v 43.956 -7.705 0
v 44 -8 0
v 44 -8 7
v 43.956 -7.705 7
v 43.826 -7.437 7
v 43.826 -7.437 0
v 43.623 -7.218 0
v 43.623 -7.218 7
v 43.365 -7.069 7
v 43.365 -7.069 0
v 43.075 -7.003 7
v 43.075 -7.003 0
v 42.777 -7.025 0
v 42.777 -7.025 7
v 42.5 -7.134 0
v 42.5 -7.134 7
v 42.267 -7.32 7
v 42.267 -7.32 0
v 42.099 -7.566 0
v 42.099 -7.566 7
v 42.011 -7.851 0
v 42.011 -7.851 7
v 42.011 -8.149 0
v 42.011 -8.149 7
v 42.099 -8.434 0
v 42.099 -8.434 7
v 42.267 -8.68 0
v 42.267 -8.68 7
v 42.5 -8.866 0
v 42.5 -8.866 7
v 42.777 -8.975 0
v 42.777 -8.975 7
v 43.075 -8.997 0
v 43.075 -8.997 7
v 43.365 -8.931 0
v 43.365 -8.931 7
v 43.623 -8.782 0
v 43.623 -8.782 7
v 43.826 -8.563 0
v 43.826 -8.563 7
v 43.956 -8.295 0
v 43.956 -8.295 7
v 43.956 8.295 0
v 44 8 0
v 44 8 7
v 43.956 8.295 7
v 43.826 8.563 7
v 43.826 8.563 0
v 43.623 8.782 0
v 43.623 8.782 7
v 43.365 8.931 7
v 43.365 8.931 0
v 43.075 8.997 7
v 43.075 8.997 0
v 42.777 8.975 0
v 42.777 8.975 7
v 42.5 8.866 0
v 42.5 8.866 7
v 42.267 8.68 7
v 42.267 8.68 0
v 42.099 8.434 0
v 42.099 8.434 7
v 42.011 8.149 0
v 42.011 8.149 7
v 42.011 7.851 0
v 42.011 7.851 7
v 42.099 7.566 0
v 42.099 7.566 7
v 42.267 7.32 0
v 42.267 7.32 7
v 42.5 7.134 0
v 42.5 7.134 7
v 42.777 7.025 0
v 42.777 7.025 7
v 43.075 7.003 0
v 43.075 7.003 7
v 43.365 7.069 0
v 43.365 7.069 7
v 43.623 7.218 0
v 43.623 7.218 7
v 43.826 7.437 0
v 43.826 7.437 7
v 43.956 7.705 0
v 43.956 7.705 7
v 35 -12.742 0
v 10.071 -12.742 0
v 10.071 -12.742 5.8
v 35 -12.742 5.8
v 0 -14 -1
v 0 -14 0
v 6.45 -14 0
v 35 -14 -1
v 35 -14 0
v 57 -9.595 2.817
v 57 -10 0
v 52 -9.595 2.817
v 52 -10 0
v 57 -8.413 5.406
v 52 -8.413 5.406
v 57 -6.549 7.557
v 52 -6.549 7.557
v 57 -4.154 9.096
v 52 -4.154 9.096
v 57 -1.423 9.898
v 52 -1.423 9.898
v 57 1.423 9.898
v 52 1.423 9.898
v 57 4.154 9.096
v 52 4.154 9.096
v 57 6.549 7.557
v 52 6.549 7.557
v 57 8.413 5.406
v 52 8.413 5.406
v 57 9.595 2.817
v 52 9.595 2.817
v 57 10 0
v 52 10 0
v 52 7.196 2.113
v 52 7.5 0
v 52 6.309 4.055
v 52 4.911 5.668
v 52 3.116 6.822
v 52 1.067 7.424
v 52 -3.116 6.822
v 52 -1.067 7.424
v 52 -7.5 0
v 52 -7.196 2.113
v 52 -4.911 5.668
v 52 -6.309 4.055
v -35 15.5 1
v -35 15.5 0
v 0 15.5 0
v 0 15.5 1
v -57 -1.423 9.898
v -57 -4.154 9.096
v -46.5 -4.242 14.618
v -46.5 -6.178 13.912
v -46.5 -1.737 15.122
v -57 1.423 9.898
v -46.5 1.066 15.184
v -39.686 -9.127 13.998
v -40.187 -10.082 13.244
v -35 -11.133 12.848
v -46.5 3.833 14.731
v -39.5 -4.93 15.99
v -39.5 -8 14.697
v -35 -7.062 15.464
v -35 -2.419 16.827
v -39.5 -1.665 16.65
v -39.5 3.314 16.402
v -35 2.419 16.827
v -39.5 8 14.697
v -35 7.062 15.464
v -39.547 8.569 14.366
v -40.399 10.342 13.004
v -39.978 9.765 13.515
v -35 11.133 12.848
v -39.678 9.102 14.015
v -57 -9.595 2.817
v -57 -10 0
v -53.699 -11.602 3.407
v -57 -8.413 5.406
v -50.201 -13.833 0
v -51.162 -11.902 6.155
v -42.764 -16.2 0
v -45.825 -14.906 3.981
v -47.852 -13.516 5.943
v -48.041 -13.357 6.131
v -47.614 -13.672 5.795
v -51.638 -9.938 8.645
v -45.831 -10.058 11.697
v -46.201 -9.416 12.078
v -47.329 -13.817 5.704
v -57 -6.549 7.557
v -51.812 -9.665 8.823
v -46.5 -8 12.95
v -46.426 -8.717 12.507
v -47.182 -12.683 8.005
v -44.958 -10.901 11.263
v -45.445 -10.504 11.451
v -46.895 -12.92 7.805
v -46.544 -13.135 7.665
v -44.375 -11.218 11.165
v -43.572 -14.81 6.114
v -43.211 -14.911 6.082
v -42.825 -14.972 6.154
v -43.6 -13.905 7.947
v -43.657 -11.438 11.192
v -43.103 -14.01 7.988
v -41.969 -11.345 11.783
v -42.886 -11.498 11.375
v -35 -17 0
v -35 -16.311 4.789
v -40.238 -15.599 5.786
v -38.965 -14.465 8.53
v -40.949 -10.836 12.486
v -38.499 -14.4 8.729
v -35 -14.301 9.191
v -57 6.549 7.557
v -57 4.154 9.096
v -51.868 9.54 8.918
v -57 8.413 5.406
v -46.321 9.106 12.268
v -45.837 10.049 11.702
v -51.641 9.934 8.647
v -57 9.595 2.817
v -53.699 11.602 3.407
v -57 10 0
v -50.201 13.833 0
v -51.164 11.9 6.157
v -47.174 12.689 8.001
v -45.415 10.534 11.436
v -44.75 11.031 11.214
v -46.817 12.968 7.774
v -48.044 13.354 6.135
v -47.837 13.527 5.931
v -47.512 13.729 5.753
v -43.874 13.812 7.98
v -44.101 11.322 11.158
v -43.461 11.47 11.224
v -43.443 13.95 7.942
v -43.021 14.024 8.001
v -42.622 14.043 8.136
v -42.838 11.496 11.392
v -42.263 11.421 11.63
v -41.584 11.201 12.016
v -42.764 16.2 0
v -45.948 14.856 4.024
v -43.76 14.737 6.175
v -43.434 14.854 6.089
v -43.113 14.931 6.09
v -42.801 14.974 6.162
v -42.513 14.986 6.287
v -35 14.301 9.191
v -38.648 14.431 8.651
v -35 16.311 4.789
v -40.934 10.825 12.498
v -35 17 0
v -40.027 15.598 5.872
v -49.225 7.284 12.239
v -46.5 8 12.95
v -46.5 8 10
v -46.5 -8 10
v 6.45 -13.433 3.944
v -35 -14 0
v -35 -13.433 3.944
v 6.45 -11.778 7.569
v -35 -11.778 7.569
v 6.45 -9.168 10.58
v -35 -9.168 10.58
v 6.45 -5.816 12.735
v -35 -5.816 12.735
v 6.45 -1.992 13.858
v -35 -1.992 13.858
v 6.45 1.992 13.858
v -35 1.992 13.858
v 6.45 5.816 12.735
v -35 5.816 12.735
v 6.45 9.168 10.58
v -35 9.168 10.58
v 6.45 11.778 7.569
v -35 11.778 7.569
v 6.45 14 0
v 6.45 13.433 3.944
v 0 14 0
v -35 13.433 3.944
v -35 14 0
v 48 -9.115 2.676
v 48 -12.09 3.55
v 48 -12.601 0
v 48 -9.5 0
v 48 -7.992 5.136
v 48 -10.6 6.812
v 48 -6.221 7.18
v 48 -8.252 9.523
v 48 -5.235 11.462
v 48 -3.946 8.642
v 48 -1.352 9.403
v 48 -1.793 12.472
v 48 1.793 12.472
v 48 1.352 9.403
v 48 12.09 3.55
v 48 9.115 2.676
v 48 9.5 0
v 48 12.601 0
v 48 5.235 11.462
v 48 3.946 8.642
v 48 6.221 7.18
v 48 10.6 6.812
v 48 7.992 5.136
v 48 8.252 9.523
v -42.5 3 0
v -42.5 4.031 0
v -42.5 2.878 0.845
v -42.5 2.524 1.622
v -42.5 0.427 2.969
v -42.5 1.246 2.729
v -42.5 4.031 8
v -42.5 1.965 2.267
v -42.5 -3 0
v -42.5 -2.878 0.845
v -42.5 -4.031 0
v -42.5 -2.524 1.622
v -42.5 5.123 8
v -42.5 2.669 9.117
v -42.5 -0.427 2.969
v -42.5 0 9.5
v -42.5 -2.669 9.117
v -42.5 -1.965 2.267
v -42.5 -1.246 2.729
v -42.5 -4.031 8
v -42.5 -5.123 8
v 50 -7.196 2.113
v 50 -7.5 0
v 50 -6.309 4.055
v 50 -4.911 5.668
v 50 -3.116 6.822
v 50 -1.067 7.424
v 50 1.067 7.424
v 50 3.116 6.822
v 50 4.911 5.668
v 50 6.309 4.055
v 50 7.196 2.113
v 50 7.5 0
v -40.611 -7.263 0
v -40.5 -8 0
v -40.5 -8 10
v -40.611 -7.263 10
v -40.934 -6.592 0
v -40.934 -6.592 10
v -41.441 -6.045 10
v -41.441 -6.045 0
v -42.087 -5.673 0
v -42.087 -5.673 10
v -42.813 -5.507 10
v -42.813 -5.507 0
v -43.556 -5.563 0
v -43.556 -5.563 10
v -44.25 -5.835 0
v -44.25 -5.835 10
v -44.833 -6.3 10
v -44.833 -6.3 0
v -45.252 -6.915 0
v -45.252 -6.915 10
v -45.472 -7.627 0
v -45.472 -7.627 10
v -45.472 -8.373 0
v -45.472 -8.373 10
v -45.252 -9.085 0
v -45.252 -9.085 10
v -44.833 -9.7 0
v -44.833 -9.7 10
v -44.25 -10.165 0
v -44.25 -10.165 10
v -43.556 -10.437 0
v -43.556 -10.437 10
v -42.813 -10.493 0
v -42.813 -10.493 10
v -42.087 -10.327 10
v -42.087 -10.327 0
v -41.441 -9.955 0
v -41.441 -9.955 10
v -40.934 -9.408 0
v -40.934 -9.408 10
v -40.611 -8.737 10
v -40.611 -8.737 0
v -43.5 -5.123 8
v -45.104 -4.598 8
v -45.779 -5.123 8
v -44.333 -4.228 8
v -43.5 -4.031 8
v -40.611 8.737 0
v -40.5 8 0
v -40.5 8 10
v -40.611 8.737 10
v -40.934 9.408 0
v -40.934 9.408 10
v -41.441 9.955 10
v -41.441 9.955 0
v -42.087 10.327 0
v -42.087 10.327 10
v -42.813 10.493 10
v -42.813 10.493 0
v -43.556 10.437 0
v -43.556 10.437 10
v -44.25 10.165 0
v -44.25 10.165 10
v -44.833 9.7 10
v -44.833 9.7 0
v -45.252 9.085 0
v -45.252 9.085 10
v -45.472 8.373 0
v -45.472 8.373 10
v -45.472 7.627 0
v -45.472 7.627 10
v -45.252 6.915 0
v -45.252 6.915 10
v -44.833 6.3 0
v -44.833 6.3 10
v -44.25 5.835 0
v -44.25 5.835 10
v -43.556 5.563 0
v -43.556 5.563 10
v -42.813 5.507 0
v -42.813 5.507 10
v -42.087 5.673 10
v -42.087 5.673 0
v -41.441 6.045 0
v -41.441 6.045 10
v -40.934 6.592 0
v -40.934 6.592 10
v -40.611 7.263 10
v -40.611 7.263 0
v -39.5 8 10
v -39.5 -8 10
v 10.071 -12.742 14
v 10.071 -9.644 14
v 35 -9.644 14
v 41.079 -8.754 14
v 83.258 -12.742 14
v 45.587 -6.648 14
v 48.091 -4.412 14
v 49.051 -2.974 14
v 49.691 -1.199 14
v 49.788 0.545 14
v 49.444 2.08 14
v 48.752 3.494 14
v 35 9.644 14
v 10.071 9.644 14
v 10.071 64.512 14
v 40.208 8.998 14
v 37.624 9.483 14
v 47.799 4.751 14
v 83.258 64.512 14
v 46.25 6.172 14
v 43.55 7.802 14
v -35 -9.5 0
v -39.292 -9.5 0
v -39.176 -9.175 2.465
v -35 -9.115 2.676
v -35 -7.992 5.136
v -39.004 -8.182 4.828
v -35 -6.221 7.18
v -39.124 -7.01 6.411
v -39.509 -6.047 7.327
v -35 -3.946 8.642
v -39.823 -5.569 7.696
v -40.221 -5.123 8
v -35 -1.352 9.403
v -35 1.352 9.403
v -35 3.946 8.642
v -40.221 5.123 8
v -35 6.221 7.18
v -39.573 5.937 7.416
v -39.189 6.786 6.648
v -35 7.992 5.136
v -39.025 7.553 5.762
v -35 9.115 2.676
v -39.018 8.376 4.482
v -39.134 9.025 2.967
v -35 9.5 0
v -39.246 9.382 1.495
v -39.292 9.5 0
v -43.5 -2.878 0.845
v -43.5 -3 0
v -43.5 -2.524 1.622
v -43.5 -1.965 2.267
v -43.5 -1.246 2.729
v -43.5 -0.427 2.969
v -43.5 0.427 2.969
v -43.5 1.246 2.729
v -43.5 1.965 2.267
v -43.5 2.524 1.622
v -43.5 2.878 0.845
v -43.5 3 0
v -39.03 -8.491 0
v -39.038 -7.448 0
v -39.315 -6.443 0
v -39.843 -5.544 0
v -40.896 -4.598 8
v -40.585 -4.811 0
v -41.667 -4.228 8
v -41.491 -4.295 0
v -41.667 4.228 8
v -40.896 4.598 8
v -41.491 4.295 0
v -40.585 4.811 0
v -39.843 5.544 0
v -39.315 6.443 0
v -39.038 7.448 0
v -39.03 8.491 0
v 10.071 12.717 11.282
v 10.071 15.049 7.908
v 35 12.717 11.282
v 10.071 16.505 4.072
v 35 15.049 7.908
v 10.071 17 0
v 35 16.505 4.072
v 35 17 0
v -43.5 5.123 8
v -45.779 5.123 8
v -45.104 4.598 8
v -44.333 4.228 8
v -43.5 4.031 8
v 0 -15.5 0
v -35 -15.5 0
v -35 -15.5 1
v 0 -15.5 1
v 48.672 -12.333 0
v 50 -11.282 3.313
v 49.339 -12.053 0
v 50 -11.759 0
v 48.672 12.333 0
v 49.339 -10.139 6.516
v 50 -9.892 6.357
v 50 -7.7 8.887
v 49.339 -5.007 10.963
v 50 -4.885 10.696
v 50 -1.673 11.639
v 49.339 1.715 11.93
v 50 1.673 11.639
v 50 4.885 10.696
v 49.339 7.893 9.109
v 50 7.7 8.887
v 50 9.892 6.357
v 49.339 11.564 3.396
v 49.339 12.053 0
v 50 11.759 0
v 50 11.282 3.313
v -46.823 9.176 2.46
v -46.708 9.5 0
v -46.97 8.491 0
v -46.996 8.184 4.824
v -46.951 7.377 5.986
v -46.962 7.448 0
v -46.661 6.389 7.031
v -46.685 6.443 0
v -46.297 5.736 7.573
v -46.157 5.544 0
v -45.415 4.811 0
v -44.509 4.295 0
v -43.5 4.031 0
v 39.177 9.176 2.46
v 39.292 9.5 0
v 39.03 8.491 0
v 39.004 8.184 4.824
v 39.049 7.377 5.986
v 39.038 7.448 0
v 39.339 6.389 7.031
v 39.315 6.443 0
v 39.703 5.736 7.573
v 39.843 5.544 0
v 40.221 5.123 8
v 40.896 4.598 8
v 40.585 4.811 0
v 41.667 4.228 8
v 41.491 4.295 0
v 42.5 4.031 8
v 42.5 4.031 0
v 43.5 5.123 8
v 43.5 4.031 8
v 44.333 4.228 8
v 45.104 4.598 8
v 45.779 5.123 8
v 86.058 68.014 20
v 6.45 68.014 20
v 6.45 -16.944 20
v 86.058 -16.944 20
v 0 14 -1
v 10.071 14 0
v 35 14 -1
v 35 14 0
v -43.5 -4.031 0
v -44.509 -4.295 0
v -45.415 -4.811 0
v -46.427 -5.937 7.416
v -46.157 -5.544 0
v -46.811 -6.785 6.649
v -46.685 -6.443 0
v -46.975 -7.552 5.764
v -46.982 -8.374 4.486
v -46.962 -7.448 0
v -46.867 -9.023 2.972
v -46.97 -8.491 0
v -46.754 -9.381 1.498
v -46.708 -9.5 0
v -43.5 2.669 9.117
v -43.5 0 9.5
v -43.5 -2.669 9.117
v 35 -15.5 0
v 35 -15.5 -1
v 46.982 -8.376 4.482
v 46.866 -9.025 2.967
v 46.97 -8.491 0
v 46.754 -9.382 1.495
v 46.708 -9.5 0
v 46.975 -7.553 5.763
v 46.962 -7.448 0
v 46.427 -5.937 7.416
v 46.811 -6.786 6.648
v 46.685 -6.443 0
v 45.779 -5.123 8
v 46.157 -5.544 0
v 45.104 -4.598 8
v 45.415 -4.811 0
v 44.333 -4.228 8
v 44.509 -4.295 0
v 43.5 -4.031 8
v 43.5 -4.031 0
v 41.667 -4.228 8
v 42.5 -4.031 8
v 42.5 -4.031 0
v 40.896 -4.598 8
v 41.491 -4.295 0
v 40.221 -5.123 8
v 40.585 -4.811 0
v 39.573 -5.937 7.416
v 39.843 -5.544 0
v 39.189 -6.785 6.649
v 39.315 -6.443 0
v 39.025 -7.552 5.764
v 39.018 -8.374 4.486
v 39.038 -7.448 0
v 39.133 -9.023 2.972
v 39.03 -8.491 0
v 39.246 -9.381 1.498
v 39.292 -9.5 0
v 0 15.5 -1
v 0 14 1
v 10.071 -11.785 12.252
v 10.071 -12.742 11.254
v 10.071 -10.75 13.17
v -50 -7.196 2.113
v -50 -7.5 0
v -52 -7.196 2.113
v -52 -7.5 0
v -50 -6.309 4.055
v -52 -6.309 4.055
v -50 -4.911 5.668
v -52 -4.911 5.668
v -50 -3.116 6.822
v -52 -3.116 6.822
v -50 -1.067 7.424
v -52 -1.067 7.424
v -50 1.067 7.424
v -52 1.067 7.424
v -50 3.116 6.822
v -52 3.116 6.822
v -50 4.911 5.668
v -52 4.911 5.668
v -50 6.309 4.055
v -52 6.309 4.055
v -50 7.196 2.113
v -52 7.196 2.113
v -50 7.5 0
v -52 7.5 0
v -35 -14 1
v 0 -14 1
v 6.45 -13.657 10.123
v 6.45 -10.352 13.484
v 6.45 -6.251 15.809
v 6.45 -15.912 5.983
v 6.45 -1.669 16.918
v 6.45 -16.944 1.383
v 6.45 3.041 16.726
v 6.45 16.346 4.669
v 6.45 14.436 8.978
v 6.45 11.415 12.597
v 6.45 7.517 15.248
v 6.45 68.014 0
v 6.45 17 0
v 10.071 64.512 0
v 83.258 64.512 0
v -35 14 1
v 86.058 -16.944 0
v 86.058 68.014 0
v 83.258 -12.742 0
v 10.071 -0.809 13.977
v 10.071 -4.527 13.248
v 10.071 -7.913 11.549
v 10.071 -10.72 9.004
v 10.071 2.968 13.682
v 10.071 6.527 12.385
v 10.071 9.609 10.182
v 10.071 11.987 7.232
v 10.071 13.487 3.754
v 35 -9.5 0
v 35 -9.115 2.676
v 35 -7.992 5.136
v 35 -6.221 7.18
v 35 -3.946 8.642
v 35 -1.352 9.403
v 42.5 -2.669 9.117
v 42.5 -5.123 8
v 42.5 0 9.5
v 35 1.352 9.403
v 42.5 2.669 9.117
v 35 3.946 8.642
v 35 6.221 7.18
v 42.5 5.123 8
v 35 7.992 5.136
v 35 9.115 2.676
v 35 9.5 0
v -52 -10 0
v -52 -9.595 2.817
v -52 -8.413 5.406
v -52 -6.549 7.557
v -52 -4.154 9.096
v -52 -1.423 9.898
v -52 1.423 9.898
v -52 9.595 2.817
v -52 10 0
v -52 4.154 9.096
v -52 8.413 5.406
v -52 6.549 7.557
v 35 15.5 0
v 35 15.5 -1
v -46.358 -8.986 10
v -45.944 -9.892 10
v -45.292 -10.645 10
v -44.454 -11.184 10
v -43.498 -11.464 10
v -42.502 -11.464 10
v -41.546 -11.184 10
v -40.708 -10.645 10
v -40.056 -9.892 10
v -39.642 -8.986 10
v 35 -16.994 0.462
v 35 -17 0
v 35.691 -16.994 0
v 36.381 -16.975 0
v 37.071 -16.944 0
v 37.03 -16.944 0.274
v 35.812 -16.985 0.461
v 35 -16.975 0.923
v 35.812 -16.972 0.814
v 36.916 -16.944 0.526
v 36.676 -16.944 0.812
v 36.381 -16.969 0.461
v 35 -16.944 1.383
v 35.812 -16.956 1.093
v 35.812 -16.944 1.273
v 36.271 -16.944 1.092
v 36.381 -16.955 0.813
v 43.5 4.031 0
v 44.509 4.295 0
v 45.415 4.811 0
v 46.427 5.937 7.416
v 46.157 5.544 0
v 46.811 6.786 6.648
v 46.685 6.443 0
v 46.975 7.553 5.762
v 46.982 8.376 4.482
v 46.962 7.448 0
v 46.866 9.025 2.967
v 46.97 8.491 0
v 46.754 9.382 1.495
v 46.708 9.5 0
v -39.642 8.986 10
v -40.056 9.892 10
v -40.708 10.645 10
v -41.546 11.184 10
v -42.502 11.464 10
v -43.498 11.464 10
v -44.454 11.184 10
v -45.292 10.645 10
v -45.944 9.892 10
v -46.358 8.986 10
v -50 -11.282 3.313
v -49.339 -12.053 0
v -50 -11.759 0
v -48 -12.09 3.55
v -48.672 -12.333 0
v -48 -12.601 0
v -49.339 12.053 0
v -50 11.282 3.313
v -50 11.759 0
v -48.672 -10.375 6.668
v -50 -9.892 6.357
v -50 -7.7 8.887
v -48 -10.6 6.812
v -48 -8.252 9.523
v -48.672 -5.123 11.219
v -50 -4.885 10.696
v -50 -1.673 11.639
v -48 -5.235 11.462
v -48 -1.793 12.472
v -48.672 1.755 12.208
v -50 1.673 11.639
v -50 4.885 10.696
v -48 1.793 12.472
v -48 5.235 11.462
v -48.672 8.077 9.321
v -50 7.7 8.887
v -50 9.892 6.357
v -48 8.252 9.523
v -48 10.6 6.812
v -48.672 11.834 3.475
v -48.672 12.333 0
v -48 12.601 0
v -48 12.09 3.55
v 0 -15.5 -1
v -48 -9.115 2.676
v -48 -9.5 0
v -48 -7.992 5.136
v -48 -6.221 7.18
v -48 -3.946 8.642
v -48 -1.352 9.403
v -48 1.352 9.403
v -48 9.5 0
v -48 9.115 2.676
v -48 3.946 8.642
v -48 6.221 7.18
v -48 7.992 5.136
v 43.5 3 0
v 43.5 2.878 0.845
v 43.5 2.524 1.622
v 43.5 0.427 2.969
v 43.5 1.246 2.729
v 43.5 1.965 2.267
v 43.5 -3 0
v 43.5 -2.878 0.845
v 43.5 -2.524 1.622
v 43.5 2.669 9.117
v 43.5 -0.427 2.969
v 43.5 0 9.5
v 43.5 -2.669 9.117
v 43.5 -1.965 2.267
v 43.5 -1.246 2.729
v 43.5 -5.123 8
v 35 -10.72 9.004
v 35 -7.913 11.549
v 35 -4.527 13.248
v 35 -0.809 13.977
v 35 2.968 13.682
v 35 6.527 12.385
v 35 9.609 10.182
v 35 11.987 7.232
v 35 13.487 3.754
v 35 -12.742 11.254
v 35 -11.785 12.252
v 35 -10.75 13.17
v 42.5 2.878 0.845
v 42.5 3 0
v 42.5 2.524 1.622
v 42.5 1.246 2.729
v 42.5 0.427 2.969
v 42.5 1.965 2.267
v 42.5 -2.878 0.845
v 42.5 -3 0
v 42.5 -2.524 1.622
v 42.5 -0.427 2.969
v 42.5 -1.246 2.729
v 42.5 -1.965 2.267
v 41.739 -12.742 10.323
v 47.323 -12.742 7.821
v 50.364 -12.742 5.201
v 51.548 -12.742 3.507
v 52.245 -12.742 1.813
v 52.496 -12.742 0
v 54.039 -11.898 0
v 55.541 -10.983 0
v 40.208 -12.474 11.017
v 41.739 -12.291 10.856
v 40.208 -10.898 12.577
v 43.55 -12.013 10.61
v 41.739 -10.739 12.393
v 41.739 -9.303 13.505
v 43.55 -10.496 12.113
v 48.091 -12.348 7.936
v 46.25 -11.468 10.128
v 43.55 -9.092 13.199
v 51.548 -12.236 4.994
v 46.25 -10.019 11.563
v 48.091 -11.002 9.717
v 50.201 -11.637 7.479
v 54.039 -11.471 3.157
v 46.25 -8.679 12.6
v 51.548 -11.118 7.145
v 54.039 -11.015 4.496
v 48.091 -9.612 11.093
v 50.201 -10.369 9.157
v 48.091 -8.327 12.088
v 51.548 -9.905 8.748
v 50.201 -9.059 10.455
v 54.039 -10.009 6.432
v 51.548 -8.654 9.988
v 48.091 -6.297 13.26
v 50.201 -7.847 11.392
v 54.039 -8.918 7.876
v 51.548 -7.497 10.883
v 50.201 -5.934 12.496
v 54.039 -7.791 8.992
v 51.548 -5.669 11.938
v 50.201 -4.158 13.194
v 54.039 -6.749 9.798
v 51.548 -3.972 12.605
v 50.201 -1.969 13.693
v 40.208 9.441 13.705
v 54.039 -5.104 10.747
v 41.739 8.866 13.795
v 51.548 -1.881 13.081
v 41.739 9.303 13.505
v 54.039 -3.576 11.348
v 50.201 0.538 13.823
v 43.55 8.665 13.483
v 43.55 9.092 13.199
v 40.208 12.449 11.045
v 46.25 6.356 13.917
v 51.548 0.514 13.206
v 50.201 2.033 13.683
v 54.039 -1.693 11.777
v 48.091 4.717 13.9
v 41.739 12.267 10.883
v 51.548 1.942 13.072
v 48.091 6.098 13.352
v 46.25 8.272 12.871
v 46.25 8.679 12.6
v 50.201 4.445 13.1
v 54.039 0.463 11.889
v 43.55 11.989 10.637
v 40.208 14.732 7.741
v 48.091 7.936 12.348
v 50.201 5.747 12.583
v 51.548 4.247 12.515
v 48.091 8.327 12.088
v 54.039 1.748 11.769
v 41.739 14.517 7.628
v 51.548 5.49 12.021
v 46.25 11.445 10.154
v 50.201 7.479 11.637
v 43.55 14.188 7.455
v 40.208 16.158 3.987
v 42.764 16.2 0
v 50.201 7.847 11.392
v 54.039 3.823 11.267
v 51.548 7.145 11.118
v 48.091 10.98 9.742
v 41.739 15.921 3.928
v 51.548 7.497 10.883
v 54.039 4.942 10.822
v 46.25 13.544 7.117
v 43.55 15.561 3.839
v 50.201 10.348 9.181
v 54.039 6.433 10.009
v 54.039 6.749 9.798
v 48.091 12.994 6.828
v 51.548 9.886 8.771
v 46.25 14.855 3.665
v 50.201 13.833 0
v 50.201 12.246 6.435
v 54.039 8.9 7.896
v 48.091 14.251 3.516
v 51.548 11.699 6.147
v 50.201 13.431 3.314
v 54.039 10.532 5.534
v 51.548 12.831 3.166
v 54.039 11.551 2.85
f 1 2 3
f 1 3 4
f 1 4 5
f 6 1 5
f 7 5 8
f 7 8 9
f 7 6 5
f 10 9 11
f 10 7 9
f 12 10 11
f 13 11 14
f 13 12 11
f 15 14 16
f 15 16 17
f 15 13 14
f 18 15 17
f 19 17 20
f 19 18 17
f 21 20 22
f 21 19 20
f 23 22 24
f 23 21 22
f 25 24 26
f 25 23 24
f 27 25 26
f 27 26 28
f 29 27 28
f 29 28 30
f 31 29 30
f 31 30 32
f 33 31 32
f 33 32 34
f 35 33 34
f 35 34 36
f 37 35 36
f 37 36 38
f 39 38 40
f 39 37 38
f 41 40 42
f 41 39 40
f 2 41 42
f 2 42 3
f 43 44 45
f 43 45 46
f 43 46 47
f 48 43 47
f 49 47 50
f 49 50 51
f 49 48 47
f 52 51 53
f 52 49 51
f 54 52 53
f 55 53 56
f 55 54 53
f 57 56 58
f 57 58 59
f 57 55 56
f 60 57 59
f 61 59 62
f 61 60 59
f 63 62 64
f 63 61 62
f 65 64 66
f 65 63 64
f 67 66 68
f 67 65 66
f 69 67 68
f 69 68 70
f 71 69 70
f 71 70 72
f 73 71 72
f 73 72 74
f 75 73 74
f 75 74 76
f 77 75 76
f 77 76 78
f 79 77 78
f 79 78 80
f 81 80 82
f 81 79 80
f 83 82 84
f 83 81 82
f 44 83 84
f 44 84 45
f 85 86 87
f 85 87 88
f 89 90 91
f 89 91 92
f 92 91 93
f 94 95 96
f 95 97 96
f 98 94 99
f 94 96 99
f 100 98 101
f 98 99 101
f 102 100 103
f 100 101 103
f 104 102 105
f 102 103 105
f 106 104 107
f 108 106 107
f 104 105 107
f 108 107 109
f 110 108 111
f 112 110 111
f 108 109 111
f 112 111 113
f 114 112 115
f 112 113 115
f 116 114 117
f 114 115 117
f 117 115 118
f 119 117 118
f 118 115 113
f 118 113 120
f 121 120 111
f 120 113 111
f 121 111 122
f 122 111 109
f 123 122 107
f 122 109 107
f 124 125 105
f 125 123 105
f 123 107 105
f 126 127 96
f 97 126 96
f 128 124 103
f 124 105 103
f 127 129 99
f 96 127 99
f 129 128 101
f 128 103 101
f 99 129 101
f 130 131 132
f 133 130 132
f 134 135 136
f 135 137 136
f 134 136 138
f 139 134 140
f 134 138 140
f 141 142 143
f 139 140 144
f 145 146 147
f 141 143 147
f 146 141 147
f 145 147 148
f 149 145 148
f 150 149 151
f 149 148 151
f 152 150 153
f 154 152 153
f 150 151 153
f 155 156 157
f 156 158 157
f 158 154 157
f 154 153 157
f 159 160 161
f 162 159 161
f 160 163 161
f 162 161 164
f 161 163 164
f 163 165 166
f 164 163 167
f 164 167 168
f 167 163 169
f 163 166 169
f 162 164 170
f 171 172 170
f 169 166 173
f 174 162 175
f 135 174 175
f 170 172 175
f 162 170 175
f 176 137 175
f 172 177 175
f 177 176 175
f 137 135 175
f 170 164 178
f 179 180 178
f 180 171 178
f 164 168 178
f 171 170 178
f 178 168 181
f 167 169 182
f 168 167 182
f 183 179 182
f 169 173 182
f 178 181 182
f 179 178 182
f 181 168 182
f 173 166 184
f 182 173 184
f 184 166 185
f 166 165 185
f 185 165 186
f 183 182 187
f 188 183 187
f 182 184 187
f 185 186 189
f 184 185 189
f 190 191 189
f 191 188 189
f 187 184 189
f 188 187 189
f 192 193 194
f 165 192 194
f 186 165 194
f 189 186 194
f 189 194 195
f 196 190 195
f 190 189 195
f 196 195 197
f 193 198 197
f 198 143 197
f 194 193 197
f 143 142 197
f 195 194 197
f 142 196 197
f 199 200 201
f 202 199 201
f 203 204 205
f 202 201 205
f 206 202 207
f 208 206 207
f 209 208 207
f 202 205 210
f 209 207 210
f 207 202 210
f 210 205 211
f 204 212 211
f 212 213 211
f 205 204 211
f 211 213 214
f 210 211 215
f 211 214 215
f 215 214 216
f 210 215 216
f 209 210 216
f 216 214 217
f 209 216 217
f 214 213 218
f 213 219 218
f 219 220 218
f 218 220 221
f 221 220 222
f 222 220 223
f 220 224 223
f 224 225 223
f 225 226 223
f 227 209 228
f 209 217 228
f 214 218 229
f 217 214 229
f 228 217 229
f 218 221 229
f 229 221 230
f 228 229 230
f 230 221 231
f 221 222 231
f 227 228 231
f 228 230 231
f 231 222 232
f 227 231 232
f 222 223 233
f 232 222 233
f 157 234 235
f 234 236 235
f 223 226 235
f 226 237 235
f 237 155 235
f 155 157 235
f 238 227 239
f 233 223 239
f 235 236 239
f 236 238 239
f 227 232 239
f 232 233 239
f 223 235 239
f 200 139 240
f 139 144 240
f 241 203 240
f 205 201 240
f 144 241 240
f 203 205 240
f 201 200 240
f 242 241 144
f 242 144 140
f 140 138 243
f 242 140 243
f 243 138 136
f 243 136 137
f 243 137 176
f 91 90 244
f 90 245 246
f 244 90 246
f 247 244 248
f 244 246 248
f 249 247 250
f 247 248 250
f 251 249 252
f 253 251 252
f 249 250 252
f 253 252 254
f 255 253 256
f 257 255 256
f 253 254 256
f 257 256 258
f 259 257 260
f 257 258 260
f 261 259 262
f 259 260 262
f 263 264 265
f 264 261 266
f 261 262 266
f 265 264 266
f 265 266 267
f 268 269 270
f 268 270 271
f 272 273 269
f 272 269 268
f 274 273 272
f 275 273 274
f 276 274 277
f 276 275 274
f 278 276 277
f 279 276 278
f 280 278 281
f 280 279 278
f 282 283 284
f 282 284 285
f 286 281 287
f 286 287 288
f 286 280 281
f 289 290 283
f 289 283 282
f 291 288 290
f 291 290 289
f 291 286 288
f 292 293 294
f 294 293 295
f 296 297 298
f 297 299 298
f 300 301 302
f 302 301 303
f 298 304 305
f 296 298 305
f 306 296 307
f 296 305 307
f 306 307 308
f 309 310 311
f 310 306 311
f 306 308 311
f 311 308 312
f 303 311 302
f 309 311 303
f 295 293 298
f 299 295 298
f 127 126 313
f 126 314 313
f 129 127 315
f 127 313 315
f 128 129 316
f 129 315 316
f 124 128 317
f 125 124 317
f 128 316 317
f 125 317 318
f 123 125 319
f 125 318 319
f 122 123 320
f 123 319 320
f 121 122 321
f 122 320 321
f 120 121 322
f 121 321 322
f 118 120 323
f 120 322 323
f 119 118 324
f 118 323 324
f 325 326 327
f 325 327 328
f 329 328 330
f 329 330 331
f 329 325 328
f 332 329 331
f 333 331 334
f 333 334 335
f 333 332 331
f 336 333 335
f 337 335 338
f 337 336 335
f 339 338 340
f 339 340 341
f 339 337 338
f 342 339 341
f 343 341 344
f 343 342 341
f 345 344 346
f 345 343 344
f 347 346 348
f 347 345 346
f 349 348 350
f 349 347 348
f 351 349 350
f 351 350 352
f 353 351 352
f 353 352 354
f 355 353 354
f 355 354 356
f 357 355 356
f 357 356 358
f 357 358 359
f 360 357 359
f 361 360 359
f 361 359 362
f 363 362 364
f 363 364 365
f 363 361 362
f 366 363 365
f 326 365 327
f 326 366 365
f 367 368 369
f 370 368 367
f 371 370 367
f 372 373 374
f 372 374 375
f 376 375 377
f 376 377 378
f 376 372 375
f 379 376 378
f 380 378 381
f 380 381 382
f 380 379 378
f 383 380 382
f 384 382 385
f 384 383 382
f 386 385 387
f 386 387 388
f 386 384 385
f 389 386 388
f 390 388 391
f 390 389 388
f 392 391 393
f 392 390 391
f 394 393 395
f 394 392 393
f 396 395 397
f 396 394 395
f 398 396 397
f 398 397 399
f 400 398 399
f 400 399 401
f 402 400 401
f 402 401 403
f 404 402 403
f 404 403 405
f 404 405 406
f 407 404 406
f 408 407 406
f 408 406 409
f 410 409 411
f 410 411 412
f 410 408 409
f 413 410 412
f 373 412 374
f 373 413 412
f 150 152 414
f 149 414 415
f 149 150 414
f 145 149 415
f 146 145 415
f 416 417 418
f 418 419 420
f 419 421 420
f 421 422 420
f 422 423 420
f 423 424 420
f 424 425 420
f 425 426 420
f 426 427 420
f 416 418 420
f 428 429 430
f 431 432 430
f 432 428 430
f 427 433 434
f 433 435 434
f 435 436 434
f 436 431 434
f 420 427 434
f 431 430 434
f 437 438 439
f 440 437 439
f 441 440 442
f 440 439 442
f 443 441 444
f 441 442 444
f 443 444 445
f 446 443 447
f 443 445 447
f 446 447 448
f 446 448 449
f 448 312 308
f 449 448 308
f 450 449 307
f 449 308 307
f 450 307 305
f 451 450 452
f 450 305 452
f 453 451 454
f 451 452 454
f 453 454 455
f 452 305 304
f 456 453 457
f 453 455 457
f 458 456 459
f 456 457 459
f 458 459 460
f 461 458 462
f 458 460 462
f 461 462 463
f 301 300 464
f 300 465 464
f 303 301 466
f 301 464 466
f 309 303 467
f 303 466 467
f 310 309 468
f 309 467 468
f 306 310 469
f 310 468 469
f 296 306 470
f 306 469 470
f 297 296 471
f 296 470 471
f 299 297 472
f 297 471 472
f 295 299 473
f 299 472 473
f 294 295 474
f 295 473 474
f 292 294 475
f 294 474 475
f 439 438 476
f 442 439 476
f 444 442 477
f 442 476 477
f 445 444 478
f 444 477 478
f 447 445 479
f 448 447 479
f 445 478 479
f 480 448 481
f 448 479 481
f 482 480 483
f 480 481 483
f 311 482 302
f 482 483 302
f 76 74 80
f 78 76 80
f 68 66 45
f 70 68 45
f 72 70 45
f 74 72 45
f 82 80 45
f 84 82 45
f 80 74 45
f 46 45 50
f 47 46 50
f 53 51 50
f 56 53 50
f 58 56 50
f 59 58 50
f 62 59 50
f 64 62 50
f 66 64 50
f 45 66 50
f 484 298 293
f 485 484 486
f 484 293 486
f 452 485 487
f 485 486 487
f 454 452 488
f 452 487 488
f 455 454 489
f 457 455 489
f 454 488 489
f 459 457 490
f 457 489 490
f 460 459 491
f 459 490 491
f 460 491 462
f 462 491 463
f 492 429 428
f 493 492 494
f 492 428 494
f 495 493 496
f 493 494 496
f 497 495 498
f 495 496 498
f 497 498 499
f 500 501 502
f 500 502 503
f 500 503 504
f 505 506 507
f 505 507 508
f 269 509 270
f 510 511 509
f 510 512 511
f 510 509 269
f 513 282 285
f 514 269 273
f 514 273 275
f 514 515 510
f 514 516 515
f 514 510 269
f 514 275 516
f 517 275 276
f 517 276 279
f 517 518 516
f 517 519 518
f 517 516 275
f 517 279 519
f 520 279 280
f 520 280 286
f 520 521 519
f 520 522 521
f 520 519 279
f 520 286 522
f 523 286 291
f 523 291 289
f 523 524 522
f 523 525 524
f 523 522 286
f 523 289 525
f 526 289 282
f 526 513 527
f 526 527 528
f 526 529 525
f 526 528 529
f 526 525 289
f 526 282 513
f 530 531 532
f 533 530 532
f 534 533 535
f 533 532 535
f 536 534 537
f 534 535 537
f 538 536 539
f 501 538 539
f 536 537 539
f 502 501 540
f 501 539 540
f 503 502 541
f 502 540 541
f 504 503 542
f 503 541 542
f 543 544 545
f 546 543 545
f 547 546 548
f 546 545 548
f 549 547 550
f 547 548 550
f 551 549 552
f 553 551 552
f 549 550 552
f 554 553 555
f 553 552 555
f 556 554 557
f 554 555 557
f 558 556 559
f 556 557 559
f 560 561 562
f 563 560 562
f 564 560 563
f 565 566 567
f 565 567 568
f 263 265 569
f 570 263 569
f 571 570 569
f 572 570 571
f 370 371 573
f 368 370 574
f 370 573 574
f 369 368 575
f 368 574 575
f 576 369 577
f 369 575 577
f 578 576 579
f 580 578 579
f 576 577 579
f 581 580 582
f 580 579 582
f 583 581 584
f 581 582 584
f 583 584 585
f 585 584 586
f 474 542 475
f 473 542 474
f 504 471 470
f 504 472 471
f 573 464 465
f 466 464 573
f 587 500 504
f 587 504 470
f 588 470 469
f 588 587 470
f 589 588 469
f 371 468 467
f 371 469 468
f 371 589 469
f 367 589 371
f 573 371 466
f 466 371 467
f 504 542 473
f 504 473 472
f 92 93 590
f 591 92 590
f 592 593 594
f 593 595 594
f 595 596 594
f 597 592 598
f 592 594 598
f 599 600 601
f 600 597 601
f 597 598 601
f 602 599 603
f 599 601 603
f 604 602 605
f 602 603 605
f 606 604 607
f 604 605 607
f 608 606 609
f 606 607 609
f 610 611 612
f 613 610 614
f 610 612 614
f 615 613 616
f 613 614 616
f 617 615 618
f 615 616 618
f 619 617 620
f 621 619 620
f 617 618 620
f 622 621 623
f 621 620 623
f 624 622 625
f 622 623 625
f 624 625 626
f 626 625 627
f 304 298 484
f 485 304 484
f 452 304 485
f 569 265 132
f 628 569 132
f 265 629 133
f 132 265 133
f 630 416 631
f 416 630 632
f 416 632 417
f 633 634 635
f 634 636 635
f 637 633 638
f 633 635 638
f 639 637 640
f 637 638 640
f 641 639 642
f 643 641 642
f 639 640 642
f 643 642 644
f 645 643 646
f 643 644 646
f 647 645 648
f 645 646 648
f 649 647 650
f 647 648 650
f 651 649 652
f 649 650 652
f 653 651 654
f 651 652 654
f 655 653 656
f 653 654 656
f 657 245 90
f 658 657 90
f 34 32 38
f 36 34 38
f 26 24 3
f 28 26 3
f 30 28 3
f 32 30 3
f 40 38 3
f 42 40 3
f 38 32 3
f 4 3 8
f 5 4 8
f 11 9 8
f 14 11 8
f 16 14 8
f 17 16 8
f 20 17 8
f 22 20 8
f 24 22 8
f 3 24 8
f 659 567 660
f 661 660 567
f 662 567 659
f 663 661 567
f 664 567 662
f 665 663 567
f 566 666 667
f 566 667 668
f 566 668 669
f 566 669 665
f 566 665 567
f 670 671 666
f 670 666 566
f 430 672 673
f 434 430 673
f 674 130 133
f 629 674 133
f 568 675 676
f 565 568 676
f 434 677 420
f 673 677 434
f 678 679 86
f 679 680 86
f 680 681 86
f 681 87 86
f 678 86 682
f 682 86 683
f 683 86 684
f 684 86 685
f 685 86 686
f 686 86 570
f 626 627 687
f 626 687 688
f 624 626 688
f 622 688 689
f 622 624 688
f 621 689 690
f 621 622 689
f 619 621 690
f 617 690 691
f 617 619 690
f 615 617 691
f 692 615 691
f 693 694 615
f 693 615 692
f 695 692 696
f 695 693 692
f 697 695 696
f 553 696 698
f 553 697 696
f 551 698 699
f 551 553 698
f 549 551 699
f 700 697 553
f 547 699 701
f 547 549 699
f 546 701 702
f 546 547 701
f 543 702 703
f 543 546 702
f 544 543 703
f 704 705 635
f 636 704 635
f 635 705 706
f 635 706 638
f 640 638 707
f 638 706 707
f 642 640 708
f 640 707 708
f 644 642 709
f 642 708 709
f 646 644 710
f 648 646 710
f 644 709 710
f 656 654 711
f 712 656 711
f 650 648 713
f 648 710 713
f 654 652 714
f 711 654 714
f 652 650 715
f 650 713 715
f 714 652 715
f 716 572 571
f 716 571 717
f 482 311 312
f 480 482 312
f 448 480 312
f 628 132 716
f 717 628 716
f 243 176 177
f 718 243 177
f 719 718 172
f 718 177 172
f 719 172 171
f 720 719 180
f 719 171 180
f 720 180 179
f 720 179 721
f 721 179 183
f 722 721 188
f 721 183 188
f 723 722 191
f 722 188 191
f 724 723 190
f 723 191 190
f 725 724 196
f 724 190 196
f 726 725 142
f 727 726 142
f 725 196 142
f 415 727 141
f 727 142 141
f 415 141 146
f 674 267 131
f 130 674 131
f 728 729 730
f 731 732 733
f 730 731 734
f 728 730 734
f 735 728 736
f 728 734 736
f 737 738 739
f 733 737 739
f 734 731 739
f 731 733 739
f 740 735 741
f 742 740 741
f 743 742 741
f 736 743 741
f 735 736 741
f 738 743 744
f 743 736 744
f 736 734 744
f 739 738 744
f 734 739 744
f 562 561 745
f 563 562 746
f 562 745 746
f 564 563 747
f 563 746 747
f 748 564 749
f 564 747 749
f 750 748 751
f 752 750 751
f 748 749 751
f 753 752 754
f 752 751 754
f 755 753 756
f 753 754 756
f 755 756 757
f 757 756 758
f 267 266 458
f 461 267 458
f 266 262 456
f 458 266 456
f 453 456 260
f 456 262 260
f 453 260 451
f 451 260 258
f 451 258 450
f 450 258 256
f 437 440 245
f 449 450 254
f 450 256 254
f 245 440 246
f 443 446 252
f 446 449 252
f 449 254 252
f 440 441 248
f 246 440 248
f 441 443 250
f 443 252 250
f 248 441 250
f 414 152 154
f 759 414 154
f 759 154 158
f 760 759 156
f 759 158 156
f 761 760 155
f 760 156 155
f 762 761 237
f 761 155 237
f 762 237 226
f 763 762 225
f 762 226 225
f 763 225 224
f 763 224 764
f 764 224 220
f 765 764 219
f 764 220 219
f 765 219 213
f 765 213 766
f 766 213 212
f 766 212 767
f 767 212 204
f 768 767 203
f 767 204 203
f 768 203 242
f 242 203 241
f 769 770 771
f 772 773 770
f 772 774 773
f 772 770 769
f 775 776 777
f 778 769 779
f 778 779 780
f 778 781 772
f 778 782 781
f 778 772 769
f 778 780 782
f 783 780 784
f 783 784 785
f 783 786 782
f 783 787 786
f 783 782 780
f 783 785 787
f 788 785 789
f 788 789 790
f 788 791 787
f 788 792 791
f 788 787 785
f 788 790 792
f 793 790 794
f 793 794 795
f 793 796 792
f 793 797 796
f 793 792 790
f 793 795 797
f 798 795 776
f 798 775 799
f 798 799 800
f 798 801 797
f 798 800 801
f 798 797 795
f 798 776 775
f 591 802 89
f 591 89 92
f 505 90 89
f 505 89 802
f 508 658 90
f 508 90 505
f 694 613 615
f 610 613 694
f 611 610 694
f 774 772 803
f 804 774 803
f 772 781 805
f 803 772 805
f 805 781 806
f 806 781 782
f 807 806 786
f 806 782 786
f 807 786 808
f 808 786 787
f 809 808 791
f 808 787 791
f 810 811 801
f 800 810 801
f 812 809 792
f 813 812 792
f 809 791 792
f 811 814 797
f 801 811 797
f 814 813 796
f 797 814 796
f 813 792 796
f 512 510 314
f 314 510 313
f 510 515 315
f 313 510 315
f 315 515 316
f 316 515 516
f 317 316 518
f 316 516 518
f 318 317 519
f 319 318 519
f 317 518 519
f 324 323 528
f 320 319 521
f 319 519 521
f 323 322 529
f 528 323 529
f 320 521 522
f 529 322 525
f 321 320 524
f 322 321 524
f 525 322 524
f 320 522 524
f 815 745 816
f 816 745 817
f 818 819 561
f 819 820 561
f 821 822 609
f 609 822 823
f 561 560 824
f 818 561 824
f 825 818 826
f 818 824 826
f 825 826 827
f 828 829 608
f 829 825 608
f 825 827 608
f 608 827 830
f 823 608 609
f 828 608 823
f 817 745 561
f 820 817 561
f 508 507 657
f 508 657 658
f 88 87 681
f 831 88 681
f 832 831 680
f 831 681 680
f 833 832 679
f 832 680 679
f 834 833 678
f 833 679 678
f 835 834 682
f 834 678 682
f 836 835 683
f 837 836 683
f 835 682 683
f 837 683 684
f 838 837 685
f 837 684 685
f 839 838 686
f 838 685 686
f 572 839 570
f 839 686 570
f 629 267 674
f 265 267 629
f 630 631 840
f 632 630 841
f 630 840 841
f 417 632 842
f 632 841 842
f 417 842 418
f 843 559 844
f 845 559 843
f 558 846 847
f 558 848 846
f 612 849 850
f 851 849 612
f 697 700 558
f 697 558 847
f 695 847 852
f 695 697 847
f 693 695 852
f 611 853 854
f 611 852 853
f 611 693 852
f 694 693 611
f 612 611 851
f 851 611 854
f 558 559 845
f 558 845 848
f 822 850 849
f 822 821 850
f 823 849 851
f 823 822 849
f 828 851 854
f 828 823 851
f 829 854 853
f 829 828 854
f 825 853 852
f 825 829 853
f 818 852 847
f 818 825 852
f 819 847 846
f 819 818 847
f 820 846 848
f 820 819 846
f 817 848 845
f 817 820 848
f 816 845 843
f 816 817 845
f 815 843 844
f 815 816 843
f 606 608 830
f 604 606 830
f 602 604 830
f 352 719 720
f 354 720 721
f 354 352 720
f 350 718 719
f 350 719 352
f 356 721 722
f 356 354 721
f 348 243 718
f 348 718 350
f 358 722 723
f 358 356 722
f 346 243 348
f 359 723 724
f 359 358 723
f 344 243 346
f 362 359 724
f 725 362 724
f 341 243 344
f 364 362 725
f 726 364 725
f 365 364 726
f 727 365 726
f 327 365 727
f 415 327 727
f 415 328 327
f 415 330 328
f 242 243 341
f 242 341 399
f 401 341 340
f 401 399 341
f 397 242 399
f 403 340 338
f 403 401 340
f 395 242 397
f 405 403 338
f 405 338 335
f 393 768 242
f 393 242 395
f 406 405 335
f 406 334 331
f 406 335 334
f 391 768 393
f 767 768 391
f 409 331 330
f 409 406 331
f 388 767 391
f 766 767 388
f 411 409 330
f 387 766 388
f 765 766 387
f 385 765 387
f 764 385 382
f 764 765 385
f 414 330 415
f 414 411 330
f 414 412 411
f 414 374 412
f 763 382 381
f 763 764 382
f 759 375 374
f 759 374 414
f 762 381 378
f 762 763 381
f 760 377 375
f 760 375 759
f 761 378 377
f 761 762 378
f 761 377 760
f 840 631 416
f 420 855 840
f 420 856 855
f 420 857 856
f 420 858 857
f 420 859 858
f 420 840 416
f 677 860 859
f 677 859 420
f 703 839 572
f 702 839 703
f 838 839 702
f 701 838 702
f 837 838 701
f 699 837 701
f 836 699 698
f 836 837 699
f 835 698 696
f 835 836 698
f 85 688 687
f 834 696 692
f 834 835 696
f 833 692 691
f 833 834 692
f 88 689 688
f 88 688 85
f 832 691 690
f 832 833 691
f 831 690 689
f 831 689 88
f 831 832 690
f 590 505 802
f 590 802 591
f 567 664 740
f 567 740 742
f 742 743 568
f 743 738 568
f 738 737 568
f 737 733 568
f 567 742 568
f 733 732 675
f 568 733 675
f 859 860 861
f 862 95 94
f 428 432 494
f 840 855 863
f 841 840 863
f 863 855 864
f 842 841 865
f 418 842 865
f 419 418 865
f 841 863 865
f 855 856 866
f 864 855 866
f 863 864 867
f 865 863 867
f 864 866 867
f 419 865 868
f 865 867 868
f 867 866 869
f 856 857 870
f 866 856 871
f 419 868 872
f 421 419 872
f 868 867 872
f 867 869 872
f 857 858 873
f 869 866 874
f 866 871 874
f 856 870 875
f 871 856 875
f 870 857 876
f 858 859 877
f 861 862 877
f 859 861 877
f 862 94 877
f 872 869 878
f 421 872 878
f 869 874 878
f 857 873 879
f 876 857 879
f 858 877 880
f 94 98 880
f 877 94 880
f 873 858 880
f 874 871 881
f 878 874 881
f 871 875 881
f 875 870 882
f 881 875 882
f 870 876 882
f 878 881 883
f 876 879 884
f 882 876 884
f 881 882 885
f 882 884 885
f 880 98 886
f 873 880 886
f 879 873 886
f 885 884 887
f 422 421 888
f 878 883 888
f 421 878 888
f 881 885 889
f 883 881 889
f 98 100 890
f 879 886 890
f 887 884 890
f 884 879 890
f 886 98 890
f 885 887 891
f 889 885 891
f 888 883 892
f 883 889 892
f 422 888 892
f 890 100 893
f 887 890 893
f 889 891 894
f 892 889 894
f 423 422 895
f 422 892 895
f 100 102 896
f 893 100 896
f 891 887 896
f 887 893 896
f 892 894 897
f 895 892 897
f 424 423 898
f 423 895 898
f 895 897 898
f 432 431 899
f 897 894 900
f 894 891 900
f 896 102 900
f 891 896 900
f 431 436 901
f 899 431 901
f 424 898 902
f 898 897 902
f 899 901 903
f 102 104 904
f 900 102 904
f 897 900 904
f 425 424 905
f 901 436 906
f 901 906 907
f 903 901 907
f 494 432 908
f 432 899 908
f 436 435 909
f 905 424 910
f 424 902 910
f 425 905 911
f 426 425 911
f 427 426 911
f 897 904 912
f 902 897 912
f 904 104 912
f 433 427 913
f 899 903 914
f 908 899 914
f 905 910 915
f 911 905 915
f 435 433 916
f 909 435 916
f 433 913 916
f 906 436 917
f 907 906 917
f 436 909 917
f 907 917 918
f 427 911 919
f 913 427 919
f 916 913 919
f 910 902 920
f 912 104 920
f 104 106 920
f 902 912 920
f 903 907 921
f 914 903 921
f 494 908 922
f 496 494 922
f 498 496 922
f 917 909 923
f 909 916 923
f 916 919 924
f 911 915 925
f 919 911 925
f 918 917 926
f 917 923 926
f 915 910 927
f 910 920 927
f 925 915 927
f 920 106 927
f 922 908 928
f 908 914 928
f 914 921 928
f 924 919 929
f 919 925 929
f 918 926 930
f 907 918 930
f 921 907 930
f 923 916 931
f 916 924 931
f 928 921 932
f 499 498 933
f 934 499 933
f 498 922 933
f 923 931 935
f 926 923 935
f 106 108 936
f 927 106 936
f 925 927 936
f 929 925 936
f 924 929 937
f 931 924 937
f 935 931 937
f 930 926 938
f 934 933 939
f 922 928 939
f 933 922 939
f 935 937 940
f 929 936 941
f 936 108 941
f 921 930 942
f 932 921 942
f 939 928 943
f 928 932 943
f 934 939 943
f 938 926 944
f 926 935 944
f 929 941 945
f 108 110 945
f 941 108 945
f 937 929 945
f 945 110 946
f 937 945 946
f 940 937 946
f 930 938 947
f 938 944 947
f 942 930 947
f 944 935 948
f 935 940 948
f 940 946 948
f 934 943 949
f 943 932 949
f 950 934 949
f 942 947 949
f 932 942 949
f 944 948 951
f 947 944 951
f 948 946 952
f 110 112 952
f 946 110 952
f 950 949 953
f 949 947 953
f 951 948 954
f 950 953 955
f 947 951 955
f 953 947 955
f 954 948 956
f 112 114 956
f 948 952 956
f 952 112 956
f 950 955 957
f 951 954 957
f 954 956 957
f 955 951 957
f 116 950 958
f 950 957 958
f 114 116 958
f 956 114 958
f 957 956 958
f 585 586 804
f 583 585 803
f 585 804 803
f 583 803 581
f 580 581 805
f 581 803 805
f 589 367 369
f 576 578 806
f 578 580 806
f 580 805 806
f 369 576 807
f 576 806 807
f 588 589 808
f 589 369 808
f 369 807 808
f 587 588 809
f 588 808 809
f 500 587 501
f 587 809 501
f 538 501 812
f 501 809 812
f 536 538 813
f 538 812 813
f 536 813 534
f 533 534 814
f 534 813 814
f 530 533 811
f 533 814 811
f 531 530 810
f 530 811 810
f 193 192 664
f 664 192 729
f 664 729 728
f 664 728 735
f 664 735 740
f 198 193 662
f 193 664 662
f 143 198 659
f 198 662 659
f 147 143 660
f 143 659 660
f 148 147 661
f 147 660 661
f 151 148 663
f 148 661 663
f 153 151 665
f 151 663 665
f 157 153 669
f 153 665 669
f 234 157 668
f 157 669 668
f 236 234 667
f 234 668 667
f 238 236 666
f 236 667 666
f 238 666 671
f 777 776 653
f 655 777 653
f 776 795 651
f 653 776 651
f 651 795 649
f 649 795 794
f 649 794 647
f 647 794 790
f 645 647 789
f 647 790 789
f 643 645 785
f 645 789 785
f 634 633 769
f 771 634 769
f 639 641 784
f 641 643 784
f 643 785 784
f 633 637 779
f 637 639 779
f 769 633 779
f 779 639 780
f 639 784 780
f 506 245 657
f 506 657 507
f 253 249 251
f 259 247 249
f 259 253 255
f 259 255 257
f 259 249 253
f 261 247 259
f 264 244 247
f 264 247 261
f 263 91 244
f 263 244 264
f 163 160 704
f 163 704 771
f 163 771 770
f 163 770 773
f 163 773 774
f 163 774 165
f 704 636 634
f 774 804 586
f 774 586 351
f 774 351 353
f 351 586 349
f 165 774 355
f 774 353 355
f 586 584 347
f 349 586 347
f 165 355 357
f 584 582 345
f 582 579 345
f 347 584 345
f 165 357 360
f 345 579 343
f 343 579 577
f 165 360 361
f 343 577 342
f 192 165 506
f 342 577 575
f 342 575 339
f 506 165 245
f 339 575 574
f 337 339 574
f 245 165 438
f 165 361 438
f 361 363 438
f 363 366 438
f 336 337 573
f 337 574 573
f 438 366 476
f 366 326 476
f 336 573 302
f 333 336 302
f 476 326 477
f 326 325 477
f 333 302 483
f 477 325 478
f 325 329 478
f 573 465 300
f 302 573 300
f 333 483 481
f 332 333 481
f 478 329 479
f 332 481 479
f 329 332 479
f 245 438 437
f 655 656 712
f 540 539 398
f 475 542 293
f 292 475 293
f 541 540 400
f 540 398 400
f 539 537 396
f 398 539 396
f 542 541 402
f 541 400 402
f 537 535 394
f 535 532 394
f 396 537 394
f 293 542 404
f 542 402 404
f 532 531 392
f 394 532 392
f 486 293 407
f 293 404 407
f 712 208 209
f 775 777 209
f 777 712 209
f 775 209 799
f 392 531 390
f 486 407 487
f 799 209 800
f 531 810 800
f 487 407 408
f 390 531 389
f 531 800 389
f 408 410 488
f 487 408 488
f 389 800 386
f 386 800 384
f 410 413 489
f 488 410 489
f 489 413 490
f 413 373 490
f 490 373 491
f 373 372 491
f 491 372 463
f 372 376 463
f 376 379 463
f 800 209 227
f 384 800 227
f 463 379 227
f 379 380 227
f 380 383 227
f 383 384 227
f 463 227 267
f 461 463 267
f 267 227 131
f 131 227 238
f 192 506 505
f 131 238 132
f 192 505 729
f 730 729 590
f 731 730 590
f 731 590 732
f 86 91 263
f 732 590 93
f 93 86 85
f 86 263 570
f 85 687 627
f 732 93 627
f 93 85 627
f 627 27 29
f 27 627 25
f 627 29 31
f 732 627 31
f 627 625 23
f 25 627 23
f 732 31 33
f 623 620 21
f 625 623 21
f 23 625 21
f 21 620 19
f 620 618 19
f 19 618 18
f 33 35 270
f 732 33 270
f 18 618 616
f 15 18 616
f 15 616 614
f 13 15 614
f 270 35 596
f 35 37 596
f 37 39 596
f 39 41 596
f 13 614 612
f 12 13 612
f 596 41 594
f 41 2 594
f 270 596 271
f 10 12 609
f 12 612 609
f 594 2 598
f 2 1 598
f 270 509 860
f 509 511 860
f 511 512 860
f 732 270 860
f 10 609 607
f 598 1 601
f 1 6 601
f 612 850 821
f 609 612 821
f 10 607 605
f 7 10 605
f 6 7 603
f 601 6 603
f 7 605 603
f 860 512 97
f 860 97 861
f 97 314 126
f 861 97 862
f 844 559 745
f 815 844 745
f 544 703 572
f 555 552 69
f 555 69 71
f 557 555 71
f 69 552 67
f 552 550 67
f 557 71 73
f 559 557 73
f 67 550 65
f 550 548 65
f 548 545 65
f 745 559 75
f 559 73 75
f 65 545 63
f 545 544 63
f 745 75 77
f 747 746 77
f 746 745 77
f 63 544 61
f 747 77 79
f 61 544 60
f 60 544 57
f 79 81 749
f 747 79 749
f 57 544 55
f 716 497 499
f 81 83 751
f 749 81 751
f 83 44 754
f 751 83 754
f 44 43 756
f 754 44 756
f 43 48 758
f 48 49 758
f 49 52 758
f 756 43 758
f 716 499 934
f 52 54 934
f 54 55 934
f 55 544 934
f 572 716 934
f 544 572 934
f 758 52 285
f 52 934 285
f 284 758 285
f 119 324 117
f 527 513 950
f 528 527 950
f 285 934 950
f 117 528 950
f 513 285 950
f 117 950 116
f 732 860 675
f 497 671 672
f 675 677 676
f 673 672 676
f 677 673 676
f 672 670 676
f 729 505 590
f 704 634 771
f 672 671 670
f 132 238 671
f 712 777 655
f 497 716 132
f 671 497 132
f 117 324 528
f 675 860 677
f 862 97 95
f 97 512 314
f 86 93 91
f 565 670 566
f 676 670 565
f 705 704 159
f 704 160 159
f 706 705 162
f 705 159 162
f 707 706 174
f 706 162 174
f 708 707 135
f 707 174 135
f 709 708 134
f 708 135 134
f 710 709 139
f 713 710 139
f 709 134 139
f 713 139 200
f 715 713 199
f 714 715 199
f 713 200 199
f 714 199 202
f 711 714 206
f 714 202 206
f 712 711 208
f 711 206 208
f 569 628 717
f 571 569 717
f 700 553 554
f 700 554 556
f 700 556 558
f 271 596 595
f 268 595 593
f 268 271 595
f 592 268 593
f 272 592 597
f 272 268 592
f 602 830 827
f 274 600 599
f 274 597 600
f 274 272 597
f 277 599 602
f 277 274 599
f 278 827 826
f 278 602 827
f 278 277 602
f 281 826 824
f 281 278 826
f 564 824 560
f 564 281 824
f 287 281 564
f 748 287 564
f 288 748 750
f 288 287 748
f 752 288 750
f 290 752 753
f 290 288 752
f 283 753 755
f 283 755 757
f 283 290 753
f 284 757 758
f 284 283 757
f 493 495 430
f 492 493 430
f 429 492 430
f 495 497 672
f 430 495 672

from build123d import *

# Parameters (mm, degrees)
SKETCH008_W         = 79.607547
SKETCH008_H         = 84.957516
PAD002_DEPTH        = 20
SKETCH009_W         = 73.187564
SKETCH009_H         = 77.253553
POCKET004_DEPTH     = 14
REVOLUTION_ANGLE    = -180
SKETCH001_W         = 35
SKETCH001_H         = 1.5
PAD_DEPTH           = 1
SKETCH002_W         = 35
SKETCH002_H         = 1.5
POCKET_DEPTH        = 1
SKETCH003_R         = 4
PAD001_DEPTH        = 8
SKETCH004_W         = 1
SKETCH004_H         = 9.534319
REVOLUTION001_ANGLE = -180
SKETCH005_R         = 1
POCKET001_DEPTH     = 7
SKETCH006_R         = 2.5
POCKET002_DEPTH     = 10
POCKET003_DEPTH     = 10


with BuildPart() as body001:
    # Sketch008 → Pad002 (new body)
    with BuildSketch(Plane.XY):
        with Locations((46.254125, -8.464853)):
            Rectangle(SKETCH008_W, SKETCH008_H)
    extrude(amount=PAD002_DEPTH)

    # Sketch009 → Pocket004 (cut)
    with BuildSketch(Plane.XY):
        with Locations((46.664473, -8.115113)):
            Rectangle(SKETCH009_W, SKETCH009_H)
    extrude(amount=POCKET004_DEPTH, mode=Mode.SUBTRACT)


with BuildPart() as body001_1:
    # Body001 placement: moved
    add(body001.part.moved(Location((0, 34, 0))))


with BuildPart() as fusion:
    # Sketch → Revolution (revolve)
    with BuildSketch(Plane.XY):
        with BuildLine():
            Line((-35, -17), (35, -17))
            ThreePointArc((35, -17), (46.543396, -15.207817), (57, -10))
            Line((57, -10), (52, -10))
            Line((52, -10), (52, -7.5))
            Line((52, -7.5), (50, -7.5))
            Line((50, -7.5), (50, -11.758585))
            ThreePointArc((48, -12.600664), (49.00633, -12.194658), (50, -11.758585))
            Line((48, -9.5), (48, -12.600664))
            Line((35, -9.5), (48, -9.5))
            Line((35, -14), (35, -9.5))
            Line((35, -14), (-35, -14))
            Line((-35, -14), (-35, -9.5))
            Line((-35, -9.5), (-48, -9.5))
            Line((-48, -9.5), (-48, -12.600664))
            ThreePointArc((-50, -11.758585), (-49.00633, -12.194658), (-48, -12.600664))
            Line((-50, -11.758585), (-50, -7.5))
            Line((-50, -7.5), (-52, -7.5))
            Line((-52, -7.5), (-52, -10))
            Line((-52, -10), (-57, -10))
            ThreePointArc((-57, -10), (-46.543396, -15.207817), (-35, -17))
        make_face()
    revolve(axis=Axis((0, 0, 0), (1, 0, 0)), revolution_arc=REVOLUTION_ANGLE)

    # Sketch001 → Pad (new body)
    with BuildSketch(Plane.XY):
        with Locations((17.5, 14.75)):
            Rectangle(SKETCH001_W, SKETCH001_H)
    pad = extrude(amount=-PAD_DEPTH)

    # Mirrored: Pad across XZ
    add(pad.mirror(Plane.XZ))

    # Sketch002 → Pocket (cut)
    with BuildSketch(Plane.XY):
        with Locations((-17.5, 14.75)):
            Rectangle(SKETCH002_W, SKETCH002_H)
    pocket = extrude(amount=POCKET_DEPTH, mode=Mode.SUBTRACT)

    # Mirrored001: Pocket across XZ
    add(pocket.mirror(Plane.XZ), mode=Mode.SUBTRACT)

    # Sketch003 → Pad001 (join)
    with BuildSketch(Plane.XY):
        with Locations((43, -8)):
            Circle(SKETCH003_R)
        with Locations((-43, -8)):
            Circle(SKETCH003_R)
        with Locations((-43, 8)):
            Circle(SKETCH003_R)
        with Locations((43, 8)):
            Circle(SKETCH003_R)
    extrude(amount=PAD001_DEPTH)

    # Sketch004 → Revolution001 (revolve)
    with BuildSketch(Plane.XY):
        with Locations((43, -7.767159)):
            Rectangle(SKETCH004_W, SKETCH004_H)
    revolution001 = revolve(axis=Axis((0, 0, 0), (1, 0, 0)), revolution_arc=REVOLUTION001_ANGLE)

    # Mirrored002: Revolution001 across YZ
    add(revolution001.mirror(Plane.YZ))

    # Sketch005 → Pocket001 (cut)
    with BuildSketch(Plane.XY):
        with Locations((43, 8)):
            Circle(SKETCH005_R)
        with Locations((43, -8)):
            Circle(SKETCH005_R)
    extrude(amount=POCKET001_DEPTH, mode=Mode.SUBTRACT)

    # Sketch006 → Pocket002 (cut)
    with BuildSketch(Plane.XY):
        with Locations((-43, 8)):
            Circle(SKETCH006_R)
        with Locations((-43, -8)):
            Circle(SKETCH006_R)
    extrude(amount=POCKET002_DEPTH, mode=Mode.SUBTRACT)

    # Sketch007 → Pocket003 (cut)
    with BuildSketch(Plane.XY.offset(20)):
        with BuildLine():
            ThreePointArc((-39.5, 8), (-43, 11.5), (-46.5, 8))
            Line((-46.5, 8), (-46.5, -8))
            ThreePointArc((-46.5, -8), (-43, -11.5), (-39.5, -8))
            Line((-39.5, 8), (-39.5, -8))
        make_face()
    extrude(amount=-POCKET003_DEPTH, mode=Mode.SUBTRACT)

    # Fusion: union Body001
    add(body001_1.part)


solid = fusion.part
